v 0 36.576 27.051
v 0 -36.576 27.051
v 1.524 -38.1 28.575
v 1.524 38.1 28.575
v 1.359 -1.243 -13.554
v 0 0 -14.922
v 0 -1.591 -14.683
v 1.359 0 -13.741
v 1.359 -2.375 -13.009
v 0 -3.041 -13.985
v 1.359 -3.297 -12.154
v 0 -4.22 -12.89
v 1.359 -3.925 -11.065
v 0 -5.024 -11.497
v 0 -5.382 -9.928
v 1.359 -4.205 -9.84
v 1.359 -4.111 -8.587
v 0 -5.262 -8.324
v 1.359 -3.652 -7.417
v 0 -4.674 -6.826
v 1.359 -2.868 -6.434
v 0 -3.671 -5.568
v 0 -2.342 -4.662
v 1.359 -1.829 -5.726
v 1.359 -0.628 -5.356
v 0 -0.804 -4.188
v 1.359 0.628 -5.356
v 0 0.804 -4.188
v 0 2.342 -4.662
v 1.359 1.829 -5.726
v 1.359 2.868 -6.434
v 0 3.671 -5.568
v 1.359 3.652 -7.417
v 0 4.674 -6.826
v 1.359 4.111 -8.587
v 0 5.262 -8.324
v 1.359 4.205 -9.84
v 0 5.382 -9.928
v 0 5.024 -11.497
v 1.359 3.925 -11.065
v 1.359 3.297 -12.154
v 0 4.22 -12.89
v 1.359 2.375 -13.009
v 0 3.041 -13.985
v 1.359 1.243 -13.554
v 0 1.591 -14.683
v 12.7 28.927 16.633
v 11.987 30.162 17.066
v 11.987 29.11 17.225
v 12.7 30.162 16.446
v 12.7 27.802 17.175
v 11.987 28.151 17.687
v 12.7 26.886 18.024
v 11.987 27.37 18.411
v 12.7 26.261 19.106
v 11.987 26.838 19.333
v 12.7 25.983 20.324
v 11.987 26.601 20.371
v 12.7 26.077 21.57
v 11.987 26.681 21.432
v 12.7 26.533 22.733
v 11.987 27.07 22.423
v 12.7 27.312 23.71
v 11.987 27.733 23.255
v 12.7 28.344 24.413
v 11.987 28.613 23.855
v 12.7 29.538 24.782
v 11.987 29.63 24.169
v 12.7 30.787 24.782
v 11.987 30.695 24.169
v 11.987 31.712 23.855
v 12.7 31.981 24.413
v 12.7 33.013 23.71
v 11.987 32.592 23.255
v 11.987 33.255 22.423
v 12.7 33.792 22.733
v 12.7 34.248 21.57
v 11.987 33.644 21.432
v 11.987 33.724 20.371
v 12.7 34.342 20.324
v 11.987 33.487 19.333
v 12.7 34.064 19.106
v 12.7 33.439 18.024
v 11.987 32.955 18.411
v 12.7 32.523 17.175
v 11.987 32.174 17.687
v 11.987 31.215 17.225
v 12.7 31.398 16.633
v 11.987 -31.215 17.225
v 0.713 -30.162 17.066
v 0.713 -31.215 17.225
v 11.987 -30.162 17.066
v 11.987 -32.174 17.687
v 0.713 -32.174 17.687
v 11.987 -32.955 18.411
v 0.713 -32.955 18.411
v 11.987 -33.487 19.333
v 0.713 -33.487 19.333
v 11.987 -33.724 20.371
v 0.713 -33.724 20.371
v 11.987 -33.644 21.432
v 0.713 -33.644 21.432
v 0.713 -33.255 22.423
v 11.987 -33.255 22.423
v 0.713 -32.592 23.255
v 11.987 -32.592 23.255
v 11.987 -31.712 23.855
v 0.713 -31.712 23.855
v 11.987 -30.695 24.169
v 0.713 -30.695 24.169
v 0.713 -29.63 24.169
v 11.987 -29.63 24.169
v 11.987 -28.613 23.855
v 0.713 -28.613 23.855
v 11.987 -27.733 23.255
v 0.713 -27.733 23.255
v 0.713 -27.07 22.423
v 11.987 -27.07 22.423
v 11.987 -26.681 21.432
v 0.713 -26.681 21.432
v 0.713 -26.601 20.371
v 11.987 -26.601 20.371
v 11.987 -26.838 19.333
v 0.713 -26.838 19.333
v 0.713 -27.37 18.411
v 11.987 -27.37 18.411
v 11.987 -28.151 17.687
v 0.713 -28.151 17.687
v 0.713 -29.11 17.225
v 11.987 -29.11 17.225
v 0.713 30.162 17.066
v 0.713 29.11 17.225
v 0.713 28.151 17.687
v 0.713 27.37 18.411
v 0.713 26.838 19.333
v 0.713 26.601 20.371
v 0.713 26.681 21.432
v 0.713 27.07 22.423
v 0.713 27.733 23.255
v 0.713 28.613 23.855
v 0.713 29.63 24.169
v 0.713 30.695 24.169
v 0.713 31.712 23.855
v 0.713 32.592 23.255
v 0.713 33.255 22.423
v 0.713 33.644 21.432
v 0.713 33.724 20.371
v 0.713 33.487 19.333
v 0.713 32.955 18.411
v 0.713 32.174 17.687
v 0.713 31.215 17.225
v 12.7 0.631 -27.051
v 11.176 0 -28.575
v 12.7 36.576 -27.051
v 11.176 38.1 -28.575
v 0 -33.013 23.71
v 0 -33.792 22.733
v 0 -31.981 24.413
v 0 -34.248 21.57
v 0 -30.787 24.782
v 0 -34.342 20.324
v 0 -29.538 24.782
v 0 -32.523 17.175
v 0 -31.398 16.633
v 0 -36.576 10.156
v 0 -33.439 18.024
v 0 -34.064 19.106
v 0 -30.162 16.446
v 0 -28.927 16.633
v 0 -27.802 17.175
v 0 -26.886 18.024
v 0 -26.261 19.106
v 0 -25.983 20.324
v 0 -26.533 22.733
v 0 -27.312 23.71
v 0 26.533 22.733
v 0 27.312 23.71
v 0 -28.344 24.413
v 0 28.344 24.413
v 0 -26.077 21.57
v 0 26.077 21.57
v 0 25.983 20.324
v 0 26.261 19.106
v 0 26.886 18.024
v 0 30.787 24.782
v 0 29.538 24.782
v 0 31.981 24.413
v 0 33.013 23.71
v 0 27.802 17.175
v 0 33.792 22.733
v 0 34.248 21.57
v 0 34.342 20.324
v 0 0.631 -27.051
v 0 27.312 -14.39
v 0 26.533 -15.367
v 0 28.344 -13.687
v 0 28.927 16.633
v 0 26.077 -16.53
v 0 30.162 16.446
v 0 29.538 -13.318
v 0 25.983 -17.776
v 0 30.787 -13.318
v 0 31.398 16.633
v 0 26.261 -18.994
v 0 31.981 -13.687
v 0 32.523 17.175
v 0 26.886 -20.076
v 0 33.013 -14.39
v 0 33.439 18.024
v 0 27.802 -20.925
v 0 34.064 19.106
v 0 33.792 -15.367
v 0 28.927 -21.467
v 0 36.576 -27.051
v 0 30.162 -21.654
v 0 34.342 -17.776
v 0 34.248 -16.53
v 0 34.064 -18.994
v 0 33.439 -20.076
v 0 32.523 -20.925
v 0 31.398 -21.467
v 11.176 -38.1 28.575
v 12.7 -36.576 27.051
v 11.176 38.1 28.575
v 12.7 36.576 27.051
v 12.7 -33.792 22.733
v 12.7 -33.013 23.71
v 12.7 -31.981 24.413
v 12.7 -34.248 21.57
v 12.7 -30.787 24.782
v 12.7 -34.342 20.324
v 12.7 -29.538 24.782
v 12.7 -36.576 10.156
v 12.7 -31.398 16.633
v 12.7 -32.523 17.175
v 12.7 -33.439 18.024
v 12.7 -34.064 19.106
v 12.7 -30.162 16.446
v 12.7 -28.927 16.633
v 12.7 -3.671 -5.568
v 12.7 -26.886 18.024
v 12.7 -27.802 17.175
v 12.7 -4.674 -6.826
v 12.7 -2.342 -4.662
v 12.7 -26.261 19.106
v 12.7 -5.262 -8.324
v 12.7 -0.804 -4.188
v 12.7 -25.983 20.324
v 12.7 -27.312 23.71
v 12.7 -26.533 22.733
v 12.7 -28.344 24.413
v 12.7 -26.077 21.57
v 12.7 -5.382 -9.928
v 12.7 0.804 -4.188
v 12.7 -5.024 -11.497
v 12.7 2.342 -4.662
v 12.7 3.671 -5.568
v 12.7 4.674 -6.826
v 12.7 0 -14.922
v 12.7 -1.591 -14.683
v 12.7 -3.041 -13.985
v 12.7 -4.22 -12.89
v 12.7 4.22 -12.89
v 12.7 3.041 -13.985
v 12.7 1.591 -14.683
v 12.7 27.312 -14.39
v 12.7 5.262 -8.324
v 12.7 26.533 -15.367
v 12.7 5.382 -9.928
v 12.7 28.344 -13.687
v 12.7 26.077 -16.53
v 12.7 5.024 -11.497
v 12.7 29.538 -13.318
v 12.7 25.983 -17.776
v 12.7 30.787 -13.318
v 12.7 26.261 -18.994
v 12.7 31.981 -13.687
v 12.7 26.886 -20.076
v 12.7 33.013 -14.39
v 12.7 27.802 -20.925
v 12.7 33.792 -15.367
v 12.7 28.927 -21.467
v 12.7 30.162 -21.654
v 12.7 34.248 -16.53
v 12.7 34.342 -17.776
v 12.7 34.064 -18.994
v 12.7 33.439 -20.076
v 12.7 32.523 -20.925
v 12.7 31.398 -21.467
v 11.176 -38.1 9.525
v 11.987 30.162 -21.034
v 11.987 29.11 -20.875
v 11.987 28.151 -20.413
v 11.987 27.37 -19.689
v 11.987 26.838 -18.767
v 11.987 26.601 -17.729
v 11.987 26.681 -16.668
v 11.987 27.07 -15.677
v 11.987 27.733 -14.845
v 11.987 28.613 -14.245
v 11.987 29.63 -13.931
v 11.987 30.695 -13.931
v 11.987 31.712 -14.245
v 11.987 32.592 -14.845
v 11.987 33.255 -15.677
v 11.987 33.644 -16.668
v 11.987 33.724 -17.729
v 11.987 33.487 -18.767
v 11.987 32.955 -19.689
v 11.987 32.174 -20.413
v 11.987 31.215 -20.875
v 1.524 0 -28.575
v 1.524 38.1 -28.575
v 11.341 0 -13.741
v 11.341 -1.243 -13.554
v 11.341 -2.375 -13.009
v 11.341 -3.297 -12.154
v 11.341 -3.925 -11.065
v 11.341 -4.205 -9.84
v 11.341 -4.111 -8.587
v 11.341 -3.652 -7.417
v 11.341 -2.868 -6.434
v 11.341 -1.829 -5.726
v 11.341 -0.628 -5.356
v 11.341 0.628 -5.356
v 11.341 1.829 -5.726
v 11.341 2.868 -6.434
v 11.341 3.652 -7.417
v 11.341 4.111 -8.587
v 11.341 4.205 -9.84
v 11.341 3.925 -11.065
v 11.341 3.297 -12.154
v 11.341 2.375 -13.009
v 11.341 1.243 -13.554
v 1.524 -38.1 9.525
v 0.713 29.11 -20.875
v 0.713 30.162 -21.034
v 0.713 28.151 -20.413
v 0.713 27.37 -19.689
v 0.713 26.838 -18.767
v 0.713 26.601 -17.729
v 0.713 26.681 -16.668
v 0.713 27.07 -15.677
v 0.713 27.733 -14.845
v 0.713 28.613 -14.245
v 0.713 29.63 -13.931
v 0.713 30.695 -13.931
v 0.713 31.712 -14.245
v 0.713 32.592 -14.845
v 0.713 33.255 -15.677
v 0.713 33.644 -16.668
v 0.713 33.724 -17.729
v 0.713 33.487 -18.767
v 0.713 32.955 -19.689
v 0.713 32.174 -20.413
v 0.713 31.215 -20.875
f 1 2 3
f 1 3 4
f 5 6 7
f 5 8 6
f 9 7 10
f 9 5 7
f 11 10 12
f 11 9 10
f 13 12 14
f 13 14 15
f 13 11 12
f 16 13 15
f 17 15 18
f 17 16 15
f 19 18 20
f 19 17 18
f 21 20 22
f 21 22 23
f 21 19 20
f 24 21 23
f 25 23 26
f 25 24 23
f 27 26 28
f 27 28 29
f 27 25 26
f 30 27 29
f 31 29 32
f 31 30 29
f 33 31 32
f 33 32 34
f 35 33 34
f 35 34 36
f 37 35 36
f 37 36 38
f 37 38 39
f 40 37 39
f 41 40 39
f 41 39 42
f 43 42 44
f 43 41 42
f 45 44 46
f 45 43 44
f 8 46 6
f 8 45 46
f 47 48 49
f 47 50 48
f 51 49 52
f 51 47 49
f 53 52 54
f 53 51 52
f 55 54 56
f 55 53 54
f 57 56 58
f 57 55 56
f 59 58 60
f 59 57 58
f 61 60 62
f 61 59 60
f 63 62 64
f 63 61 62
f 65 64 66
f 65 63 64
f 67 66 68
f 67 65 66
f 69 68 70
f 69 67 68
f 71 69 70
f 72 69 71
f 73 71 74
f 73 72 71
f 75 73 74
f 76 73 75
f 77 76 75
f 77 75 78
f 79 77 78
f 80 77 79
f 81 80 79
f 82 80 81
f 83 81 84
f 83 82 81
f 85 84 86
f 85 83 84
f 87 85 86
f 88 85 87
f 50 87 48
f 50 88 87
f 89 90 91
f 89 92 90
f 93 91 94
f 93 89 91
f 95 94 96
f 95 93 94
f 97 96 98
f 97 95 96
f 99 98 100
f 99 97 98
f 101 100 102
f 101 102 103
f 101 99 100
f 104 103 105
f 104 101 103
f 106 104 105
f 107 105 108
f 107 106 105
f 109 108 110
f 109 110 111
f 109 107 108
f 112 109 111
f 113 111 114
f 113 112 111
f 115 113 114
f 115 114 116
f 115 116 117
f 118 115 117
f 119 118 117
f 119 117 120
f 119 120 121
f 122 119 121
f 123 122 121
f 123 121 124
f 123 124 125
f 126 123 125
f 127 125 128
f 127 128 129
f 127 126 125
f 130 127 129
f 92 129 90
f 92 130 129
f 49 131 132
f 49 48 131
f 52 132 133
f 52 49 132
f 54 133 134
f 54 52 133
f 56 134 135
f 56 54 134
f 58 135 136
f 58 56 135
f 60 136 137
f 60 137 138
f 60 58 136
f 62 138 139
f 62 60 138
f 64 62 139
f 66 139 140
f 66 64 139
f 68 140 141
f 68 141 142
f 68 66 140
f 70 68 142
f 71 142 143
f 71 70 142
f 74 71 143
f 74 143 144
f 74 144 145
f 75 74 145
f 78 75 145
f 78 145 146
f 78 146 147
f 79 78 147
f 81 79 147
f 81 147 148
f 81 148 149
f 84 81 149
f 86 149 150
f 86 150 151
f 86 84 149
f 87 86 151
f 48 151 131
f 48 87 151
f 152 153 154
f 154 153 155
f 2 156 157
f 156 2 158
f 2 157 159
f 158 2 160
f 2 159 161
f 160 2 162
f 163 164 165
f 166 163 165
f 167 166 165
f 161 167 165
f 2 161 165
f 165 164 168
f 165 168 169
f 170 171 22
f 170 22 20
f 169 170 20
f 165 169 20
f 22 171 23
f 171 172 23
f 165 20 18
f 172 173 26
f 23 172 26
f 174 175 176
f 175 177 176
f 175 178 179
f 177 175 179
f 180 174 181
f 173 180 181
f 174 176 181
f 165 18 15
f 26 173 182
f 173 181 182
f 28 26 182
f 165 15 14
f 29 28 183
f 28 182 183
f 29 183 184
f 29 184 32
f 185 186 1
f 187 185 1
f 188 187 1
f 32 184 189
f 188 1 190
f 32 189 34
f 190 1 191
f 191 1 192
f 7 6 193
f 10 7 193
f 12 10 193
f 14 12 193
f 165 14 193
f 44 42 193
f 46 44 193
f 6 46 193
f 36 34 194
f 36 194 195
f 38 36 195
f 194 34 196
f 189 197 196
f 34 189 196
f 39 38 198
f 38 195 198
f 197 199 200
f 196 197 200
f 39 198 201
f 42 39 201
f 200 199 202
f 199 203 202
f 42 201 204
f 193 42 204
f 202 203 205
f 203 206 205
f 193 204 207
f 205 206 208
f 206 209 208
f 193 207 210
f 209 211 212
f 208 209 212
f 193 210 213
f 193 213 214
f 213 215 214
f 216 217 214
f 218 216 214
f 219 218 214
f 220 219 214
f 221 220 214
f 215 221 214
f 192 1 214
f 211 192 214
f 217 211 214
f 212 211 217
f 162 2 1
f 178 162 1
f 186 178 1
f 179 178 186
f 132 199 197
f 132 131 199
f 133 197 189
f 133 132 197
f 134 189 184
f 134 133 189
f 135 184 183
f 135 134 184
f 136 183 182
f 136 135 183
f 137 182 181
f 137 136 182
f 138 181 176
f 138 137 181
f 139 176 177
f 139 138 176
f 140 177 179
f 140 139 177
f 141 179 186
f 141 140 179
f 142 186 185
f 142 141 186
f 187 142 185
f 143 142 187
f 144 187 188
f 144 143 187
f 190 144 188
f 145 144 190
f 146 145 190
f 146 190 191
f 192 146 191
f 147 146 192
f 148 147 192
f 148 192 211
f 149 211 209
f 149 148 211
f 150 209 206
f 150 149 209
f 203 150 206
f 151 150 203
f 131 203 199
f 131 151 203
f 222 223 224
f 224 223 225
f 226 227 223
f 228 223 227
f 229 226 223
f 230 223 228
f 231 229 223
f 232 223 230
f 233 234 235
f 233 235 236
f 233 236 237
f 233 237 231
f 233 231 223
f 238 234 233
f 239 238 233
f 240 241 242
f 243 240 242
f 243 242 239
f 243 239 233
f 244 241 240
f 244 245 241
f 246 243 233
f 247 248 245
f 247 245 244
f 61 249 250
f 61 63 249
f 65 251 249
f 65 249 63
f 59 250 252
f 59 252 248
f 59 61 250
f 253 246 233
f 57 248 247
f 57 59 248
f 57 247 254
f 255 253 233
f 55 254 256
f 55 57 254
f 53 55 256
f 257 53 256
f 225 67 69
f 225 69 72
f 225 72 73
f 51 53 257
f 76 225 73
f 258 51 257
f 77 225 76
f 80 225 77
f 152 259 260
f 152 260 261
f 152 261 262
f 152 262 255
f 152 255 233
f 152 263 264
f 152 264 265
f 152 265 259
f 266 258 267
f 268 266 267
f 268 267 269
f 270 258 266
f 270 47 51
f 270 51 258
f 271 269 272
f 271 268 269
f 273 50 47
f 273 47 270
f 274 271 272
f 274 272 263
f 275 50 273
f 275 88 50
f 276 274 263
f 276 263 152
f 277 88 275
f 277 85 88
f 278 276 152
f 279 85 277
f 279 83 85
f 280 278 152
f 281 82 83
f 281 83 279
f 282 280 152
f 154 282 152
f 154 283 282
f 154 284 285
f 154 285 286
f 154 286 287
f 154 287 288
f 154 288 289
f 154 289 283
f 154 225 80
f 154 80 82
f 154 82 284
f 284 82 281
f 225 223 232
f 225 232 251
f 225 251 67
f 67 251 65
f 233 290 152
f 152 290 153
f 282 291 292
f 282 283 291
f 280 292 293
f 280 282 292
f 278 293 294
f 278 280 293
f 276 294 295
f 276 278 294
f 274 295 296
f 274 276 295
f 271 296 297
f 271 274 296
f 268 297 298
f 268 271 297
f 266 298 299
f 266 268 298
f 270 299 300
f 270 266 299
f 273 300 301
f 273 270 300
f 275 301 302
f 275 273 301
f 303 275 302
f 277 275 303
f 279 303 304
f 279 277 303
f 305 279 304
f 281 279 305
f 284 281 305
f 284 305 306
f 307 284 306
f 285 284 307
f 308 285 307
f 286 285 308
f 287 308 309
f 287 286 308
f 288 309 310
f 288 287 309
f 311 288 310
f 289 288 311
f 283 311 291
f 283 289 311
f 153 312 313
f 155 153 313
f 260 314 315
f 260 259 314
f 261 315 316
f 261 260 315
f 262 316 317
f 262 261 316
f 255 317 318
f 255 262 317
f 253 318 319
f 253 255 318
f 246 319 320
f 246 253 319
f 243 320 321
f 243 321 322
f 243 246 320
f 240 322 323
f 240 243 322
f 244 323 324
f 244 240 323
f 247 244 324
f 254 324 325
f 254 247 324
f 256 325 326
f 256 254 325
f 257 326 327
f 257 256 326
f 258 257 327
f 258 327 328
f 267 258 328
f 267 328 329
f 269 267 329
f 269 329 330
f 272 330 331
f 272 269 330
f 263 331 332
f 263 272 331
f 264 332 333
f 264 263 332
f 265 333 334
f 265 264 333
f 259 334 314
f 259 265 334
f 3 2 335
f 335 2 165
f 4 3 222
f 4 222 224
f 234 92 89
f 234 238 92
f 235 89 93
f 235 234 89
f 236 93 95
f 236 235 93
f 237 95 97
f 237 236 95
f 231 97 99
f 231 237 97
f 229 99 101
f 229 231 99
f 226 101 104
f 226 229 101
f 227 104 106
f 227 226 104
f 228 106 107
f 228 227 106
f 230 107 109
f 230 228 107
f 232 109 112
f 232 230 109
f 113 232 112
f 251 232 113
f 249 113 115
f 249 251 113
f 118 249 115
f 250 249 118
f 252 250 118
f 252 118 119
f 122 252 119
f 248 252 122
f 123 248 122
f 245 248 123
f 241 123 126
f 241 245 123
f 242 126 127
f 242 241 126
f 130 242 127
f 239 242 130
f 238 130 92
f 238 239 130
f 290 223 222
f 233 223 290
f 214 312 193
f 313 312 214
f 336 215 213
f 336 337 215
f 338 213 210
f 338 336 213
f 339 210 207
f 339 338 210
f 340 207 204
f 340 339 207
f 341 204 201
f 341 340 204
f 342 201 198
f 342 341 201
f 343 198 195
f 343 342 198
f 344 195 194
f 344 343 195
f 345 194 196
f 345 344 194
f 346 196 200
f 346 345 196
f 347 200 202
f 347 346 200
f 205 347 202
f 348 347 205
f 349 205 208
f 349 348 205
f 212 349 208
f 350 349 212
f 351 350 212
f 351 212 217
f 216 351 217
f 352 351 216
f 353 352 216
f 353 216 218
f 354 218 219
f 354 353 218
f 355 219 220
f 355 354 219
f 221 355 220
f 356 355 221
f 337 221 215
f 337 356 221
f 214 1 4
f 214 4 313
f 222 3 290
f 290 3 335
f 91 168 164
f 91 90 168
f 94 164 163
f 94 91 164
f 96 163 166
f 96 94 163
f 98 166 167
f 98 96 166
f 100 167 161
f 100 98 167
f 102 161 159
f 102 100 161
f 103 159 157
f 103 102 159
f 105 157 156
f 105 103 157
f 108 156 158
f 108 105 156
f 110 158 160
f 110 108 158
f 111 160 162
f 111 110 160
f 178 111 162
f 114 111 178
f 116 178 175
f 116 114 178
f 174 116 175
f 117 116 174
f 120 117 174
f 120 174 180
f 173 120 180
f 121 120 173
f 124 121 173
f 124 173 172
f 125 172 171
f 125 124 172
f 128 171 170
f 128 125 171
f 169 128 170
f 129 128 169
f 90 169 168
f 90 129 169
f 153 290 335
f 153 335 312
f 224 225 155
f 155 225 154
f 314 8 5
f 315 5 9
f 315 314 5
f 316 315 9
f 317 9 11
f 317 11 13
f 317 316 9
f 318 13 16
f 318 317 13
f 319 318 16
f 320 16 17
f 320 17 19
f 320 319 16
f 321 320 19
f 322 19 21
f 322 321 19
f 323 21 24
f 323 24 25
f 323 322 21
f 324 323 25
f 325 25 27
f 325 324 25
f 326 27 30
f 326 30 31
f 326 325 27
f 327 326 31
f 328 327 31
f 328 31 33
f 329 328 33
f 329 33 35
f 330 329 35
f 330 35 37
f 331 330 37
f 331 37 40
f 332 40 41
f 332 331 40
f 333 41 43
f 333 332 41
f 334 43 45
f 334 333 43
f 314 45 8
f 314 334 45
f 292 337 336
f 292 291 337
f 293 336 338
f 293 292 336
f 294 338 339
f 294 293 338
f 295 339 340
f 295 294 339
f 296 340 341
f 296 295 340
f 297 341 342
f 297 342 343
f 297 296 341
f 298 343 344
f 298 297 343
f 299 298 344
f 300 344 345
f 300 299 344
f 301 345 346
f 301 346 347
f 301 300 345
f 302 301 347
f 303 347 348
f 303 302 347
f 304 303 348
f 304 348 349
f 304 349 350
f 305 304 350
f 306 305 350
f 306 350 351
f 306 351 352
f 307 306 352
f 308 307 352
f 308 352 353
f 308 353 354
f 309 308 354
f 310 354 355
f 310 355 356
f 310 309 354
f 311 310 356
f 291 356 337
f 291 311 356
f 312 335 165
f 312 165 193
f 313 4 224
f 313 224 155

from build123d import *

# Parameters (mm, degrees)
SKETCH1_W                        = 57.15
SKETCH1_H                        = 76.2
EXTRUDE1_DEPTH                   = 12.7
F_1_4_CLEARANCE_HOLE1_AT_2_COUNT = 2
F_1_4_CLEARANCE_HOLE1_AT_2_PITCH = 60.325
F_1_4_CLEARANCE_HOLE1_AT_3_COUNT = 2
F_1_4_CLEARANCE_HOLE1_AT_3_PITCH = 38.1
CUT_EXTRUDE2_DEPTH               = 13.7
CHAMFER1_SIZE                    = 1.524


with BuildPart() as part:
    # Sketch1 → Extrude1 (new body)
    with BuildSketch(Plane(origin=(0, 0, 0), x_dir=(0, 0, -1), z_dir=(1, 0, 0))):
        Rectangle(SKETCH1_W, SKETCH1_H)
    extrude(amount=EXTRUDE1_DEPTH)

    # Sketch2 → 1/4 Clearance Hole1 (revolve, cut)
    with BuildSketch(Plane(origin=(12.7, 30.1625, 20.6375), x_dir=(0, 0, -1), z_dir=(0, 1, 0))):
        Polygon((0, 0), (0, 12.7), (4.191, 12.7), (3.57124, 11.987047676), (3.57124, 0.712952324), (4.191, 0), align=None)
    f_1_4_clearance_hole1 = revolve(axis=Axis((19.05, 30.1625, 20.6375), (-1, 0, 0)), mode=Mode.SUBTRACT)

    # 1/4 Clearance Hole1 at 2: 1/4 Clearance Hole1 ×2
    with Locations(*[(0, -i * F_1_4_CLEARANCE_HOLE1_AT_2_PITCH, 0) for i in range(1, F_1_4_CLEARANCE_HOLE1_AT_2_COUNT)]):
        add(f_1_4_clearance_hole1, mode=Mode.SUBTRACT)

    # 1/4 Clearance Hole1 at 3: 1/4 Clearance Hole1 ×2
    with Locations(*[(0, 0, -i * F_1_4_CLEARANCE_HOLE1_AT_3_PITCH) for i in range(1, F_1_4_CLEARANCE_HOLE1_AT_3_COUNT)]):
        add(f_1_4_clearance_hole1, mode=Mode.SUBTRACT)

    # Sketch4 → 3/8-24 Tapped Hole1 (revolve, cut)
    with BuildSketch(Plane(origin=(12.7, 0, -9.525), x_dir=(0, 0, -1), z_dir=(0, 1, 0))):
        Polygon((0, 0), (0, 12.7), (5.3975, 12.7), (4.2164, 11.341299874), (4.2164, 1.358700126), (5.3975, 0), align=None)
    revolve(axis=Axis((19.05, 0, -9.525), (-1, 0, 0)), mode=Mode.SUBTRACT)

    # Sketch7 → Cut-Extrude2 (cut, through all)
    with BuildSketch(Plane(origin=(12.7, 0, 0), x_dir=(0, 0, -1), z_dir=(1, 0, 0))):
        Polygon((-9.525, -38.1), (28.575, 0), (28.575, -38.1), align=None)
    extrude(amount=-CUT_EXTRUDE2_DEPTH, mode=Mode.SUBTRACT)

    # Chamfer1
    chamfer1_edges = [part.edges().sort_by_distance(p)[0] for p in [
        (12.7, 38.1, 0),
        (12.7, 0, 28.575),
        (0, 38.1, 0),
        (0, 19.05, -28.575),
        (12.7, 19.05, -28.575),
        (0, -19.05, -9.525),
        (12.7, -19.05, -9.525),
        (0, -38.1, 19.05),
        (0, 0, 28.575),
        (12.7, -38.1, 19.05),
    ]]
    chamfer(chamfer1_edges, length=CHAMFER1_SIZE)


solid = part.part
